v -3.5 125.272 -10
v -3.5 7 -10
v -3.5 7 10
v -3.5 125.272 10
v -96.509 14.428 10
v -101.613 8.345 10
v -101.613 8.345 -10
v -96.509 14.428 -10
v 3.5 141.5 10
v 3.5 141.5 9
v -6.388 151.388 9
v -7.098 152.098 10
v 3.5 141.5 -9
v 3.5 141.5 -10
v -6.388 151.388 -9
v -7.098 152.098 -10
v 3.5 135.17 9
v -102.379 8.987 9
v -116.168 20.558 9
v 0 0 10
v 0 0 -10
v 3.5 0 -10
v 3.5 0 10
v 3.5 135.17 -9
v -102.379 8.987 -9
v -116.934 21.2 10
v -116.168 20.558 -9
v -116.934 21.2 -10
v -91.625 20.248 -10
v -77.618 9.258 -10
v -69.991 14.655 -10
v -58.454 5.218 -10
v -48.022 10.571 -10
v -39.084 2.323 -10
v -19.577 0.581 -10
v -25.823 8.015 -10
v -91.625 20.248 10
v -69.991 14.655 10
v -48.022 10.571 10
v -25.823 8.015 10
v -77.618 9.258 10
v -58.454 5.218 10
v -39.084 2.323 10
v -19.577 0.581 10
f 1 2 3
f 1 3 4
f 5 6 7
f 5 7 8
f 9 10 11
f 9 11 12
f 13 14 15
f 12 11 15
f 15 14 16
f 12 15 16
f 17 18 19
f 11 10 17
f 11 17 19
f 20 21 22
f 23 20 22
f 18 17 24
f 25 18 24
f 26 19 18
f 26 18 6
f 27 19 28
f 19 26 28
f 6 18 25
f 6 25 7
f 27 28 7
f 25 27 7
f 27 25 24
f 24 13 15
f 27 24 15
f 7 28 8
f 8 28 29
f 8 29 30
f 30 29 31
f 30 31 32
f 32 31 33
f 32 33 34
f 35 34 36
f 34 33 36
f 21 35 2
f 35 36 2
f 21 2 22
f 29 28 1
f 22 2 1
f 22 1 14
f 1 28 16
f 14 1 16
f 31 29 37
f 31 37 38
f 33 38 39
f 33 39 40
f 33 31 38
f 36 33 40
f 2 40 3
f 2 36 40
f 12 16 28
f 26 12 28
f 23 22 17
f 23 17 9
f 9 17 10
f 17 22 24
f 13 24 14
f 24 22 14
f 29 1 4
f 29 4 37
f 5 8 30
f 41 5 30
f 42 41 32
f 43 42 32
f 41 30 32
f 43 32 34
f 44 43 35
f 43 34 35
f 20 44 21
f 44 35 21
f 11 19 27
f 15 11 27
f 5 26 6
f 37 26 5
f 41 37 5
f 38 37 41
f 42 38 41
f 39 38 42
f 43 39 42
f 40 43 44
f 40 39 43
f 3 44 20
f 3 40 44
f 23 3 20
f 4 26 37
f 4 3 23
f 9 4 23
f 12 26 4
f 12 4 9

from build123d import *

# Parameters (mm, degrees)
BOSS_EXTRUDE1_DEPTH      = 10
BOSS_EXTRUDE1_DEPTH_BACK = 10
CUT_EXTRUDE1_DEPTH       = 213.726165923
CUT_EXTRUDE1_DEPTH_BACK  = 213.726165923
SKETCH2_W                = 18
SKETCH2_H                = 18


with BuildPart() as part:
    # Sketch1 → Boss-Extrude1 (new, two sides: drawn at the far end of the back side and taken through both)
    with BuildSketch(Plane.XY.offset(-BOSS_EXTRUDE1_DEPTH_BACK)):
        with BuildLine():
            Line((-7.098078142, 152.098078142), (-116.934338078, 21.200320767))
            Line((-116.934338078, 21.200320767), (-101.613449216, 8.344568573))
            Line((-101.613449216, 8.344568573), (-96.5092206, 14.427551362))
            ThreePointArc((-96.5092206, 14.427551362), (-48.790839046, 3.626817852), (0, 0))
            Line((0, 0), (3.5, 0))
            Line((3.5, 0), (3.5, 141.5))
            Line((3.5, 141.5), (-7.098078142, 152.098078142))
        make_face()
        with BuildLine():
            Line((-3.5, 7), (-3.5, 125.271624157))
            Line((-3.5, 125.271624157), (-91.625019277, 20.248315836))
            ThreePointArc((-91.625019277, 20.248315836), (-48.02157631, 10.570542672), (-3.5, 7))
        make_face(mode=Mode.SUBTRACT)
    extrude(amount=BOSS_EXTRUDE1_DEPTH + BOSS_EXTRUDE1_DEPTH_BACK)

    # Sketch2 → Cut-Extrude1 (cut, two sides: drawn at the far end of the back side and taken through both)
    with BuildSketch(Plane(origin=(-37.875331553, -45.138062449, 0), x_dir=(-0.7660444431189823, 0.6427876096865343, 0), z_dir=(-0.6427876096865343, -0.7660444431189825, 0)).offset(-CUT_EXTRUDE1_DEPTH_BACK)):
        with Locations((93.204203405, 0)):
            Rectangle(SKETCH2_W, SKETCH2_H)
    extrude(amount=CUT_EXTRUDE1_DEPTH + CUT_EXTRUDE1_DEPTH_BACK, mode=Mode.SUBTRACT)


solid = part.part
